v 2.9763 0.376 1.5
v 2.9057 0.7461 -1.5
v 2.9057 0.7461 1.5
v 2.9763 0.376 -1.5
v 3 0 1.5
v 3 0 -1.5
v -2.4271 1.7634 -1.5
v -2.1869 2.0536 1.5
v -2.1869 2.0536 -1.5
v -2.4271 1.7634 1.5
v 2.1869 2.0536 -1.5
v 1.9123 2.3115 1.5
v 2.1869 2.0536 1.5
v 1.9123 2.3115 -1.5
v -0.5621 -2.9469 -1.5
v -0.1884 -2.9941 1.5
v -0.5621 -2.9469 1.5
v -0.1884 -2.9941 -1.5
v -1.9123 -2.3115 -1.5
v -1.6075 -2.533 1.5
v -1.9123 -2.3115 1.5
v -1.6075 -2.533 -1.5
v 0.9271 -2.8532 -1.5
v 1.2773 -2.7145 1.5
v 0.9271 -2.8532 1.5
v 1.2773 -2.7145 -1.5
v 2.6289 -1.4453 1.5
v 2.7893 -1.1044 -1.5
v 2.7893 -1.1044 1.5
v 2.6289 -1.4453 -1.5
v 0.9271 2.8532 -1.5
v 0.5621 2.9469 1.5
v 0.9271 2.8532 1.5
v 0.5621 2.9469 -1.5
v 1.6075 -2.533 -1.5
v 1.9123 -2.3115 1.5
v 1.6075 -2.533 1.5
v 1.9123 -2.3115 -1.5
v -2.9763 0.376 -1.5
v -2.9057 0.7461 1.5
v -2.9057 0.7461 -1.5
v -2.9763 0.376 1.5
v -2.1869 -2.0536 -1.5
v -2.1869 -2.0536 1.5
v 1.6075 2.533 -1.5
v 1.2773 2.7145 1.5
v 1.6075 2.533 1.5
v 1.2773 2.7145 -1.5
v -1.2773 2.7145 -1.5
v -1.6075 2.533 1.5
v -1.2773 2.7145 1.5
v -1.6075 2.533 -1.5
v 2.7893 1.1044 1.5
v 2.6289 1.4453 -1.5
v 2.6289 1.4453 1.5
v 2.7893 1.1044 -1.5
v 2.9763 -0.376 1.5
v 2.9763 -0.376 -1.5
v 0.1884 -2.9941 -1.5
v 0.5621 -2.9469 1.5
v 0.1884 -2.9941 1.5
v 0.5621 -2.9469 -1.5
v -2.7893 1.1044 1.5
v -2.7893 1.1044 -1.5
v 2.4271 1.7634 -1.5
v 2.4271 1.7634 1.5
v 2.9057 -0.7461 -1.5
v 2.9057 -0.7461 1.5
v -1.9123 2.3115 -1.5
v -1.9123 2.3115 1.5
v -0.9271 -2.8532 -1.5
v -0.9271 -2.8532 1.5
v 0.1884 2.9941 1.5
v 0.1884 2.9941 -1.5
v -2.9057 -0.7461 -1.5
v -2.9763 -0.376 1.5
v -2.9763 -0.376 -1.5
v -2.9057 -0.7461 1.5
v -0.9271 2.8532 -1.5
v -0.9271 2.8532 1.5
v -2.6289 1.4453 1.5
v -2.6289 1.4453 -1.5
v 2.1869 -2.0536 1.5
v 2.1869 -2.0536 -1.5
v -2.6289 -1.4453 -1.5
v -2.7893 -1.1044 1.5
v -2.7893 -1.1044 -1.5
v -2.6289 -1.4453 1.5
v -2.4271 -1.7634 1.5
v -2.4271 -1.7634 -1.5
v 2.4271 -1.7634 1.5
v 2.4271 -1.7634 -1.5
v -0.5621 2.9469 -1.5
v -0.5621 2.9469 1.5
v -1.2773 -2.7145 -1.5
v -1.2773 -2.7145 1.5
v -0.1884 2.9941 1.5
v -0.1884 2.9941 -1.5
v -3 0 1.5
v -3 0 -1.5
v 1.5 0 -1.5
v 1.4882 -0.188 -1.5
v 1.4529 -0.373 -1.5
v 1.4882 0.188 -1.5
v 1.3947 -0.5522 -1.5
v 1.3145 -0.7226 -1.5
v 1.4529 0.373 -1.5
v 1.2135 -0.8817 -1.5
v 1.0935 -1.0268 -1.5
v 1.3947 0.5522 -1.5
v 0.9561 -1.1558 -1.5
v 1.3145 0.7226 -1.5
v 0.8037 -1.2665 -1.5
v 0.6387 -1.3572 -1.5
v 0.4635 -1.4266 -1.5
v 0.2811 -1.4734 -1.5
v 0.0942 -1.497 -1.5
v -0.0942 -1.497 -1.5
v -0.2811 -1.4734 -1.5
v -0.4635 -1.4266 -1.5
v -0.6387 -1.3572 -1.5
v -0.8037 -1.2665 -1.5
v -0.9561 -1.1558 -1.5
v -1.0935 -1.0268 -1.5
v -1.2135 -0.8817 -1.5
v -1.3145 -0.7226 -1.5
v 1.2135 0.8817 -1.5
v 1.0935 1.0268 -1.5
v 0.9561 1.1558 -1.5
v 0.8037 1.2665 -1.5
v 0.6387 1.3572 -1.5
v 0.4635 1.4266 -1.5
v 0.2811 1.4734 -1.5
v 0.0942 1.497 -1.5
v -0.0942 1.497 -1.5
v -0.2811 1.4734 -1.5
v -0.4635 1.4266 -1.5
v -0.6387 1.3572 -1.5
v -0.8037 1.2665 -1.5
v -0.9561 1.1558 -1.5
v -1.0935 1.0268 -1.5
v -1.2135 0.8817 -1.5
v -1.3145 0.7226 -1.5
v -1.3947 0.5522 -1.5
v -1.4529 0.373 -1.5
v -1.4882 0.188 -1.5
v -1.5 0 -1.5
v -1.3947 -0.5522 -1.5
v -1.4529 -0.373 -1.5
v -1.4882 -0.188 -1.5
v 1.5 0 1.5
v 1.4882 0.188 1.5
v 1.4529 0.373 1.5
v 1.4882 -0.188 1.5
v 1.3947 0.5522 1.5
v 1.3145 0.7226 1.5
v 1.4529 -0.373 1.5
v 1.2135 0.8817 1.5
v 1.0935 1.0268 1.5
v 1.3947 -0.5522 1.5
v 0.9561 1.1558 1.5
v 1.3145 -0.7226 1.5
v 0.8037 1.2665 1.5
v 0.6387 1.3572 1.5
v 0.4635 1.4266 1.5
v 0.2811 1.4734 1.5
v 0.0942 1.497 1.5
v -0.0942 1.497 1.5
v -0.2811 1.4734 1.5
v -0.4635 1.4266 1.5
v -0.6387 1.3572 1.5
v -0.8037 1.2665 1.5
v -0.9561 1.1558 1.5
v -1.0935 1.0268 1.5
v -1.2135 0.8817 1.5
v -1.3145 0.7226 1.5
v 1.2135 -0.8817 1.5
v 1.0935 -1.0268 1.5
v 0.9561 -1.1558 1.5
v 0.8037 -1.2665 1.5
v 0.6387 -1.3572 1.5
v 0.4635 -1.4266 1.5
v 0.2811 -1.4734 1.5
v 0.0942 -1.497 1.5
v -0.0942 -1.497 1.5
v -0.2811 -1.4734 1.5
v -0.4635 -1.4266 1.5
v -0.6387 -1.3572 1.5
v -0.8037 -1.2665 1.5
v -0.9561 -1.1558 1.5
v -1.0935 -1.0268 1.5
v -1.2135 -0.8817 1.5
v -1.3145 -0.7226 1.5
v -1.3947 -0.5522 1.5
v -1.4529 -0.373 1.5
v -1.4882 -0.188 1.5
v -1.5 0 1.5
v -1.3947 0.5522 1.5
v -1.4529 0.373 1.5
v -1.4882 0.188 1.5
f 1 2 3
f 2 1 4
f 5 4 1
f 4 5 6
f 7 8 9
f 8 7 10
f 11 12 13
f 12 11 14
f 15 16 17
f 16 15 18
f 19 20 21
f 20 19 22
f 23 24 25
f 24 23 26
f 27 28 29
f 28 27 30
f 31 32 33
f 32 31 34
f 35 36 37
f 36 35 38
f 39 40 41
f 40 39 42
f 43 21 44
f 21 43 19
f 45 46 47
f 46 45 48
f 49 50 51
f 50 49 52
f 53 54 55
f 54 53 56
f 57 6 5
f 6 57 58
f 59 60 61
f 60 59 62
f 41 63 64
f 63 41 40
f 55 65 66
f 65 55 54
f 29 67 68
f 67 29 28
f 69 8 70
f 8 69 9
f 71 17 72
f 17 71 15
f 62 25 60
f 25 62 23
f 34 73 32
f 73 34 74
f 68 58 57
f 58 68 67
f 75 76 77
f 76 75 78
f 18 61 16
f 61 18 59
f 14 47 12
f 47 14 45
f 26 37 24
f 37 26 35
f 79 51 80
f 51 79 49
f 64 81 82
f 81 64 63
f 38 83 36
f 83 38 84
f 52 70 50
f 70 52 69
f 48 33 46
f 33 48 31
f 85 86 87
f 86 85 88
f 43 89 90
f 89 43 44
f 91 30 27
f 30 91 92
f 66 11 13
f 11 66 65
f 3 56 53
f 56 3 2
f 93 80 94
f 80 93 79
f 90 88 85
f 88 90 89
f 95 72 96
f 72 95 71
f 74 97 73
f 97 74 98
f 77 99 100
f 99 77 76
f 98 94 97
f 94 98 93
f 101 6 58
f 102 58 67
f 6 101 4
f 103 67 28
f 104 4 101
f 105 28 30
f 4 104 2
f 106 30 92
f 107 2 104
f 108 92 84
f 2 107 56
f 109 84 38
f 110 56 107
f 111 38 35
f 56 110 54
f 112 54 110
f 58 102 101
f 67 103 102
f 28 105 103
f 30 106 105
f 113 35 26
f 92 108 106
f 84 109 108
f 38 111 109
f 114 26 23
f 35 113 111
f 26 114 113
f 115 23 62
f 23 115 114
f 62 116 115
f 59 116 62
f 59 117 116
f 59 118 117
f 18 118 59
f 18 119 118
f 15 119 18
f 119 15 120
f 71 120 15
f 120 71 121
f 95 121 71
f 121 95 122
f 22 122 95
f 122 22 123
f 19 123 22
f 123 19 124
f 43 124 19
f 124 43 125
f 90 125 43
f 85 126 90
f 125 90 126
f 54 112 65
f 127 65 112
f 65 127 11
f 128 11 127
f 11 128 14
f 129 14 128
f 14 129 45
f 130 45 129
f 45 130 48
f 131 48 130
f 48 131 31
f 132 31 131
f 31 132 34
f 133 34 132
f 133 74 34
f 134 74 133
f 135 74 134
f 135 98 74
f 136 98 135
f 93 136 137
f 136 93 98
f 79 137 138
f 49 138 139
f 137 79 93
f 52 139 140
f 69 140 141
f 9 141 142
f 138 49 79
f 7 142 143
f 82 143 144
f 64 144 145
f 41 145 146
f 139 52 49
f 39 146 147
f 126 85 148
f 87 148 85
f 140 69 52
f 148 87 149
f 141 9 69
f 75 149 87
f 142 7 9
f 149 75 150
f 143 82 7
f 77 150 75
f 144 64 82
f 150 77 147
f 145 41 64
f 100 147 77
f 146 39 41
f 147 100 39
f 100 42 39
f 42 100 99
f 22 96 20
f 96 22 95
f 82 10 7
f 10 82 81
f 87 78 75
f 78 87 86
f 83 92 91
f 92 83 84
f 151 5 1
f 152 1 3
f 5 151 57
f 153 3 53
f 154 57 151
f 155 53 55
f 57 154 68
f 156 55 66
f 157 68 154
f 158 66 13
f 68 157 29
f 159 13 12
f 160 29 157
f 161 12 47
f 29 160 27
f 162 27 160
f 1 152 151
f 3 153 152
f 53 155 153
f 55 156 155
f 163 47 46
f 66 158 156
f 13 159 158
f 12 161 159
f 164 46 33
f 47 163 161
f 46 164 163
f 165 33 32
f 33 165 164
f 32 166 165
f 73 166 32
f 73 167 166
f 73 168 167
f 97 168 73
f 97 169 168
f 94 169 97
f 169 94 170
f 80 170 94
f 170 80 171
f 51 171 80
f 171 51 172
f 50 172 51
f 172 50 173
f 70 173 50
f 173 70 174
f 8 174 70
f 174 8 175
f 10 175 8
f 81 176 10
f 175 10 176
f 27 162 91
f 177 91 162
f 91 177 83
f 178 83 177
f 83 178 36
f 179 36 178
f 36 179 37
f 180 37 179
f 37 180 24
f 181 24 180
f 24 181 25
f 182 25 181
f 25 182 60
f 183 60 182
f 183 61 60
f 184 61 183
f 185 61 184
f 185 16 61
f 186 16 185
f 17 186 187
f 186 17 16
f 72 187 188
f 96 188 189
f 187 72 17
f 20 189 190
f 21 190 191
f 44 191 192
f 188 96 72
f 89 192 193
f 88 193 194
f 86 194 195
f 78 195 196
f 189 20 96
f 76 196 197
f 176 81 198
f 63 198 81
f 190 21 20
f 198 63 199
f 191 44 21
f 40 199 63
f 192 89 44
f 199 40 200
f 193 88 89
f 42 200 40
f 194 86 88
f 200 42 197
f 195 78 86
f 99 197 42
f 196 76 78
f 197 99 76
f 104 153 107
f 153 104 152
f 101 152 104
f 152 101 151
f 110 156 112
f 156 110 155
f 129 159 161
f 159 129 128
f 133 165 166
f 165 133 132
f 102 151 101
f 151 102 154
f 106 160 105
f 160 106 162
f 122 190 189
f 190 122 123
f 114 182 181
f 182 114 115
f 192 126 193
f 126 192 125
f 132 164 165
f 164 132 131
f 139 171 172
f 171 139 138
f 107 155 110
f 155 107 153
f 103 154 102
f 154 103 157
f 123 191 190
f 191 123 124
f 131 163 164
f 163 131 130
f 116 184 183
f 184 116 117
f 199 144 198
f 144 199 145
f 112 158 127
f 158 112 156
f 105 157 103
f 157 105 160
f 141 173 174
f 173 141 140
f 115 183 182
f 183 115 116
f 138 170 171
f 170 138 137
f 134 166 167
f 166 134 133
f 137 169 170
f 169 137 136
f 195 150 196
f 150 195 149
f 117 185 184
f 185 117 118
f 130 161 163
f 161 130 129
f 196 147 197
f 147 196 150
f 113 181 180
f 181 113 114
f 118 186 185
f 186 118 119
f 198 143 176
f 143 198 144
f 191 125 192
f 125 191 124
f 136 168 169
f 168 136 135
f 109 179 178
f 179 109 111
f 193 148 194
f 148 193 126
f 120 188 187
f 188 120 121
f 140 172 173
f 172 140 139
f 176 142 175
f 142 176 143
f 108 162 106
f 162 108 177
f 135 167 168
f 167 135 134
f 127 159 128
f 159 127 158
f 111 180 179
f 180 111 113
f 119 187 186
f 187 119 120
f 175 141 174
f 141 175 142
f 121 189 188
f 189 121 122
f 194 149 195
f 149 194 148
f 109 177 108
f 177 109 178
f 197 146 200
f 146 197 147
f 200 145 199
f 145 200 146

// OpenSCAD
$fn = 50;


difference() {
	union() {
		translate(v = [0, 0, -1.5000000000]) {
			cylinder(h = 3, r = 3.0000000000);
		}
	}
	union() {
		translate(v = [0, 0, -100.0000000000]) {
			cylinder(h = 200, r = 1.5000000000);
		}
	}
}
